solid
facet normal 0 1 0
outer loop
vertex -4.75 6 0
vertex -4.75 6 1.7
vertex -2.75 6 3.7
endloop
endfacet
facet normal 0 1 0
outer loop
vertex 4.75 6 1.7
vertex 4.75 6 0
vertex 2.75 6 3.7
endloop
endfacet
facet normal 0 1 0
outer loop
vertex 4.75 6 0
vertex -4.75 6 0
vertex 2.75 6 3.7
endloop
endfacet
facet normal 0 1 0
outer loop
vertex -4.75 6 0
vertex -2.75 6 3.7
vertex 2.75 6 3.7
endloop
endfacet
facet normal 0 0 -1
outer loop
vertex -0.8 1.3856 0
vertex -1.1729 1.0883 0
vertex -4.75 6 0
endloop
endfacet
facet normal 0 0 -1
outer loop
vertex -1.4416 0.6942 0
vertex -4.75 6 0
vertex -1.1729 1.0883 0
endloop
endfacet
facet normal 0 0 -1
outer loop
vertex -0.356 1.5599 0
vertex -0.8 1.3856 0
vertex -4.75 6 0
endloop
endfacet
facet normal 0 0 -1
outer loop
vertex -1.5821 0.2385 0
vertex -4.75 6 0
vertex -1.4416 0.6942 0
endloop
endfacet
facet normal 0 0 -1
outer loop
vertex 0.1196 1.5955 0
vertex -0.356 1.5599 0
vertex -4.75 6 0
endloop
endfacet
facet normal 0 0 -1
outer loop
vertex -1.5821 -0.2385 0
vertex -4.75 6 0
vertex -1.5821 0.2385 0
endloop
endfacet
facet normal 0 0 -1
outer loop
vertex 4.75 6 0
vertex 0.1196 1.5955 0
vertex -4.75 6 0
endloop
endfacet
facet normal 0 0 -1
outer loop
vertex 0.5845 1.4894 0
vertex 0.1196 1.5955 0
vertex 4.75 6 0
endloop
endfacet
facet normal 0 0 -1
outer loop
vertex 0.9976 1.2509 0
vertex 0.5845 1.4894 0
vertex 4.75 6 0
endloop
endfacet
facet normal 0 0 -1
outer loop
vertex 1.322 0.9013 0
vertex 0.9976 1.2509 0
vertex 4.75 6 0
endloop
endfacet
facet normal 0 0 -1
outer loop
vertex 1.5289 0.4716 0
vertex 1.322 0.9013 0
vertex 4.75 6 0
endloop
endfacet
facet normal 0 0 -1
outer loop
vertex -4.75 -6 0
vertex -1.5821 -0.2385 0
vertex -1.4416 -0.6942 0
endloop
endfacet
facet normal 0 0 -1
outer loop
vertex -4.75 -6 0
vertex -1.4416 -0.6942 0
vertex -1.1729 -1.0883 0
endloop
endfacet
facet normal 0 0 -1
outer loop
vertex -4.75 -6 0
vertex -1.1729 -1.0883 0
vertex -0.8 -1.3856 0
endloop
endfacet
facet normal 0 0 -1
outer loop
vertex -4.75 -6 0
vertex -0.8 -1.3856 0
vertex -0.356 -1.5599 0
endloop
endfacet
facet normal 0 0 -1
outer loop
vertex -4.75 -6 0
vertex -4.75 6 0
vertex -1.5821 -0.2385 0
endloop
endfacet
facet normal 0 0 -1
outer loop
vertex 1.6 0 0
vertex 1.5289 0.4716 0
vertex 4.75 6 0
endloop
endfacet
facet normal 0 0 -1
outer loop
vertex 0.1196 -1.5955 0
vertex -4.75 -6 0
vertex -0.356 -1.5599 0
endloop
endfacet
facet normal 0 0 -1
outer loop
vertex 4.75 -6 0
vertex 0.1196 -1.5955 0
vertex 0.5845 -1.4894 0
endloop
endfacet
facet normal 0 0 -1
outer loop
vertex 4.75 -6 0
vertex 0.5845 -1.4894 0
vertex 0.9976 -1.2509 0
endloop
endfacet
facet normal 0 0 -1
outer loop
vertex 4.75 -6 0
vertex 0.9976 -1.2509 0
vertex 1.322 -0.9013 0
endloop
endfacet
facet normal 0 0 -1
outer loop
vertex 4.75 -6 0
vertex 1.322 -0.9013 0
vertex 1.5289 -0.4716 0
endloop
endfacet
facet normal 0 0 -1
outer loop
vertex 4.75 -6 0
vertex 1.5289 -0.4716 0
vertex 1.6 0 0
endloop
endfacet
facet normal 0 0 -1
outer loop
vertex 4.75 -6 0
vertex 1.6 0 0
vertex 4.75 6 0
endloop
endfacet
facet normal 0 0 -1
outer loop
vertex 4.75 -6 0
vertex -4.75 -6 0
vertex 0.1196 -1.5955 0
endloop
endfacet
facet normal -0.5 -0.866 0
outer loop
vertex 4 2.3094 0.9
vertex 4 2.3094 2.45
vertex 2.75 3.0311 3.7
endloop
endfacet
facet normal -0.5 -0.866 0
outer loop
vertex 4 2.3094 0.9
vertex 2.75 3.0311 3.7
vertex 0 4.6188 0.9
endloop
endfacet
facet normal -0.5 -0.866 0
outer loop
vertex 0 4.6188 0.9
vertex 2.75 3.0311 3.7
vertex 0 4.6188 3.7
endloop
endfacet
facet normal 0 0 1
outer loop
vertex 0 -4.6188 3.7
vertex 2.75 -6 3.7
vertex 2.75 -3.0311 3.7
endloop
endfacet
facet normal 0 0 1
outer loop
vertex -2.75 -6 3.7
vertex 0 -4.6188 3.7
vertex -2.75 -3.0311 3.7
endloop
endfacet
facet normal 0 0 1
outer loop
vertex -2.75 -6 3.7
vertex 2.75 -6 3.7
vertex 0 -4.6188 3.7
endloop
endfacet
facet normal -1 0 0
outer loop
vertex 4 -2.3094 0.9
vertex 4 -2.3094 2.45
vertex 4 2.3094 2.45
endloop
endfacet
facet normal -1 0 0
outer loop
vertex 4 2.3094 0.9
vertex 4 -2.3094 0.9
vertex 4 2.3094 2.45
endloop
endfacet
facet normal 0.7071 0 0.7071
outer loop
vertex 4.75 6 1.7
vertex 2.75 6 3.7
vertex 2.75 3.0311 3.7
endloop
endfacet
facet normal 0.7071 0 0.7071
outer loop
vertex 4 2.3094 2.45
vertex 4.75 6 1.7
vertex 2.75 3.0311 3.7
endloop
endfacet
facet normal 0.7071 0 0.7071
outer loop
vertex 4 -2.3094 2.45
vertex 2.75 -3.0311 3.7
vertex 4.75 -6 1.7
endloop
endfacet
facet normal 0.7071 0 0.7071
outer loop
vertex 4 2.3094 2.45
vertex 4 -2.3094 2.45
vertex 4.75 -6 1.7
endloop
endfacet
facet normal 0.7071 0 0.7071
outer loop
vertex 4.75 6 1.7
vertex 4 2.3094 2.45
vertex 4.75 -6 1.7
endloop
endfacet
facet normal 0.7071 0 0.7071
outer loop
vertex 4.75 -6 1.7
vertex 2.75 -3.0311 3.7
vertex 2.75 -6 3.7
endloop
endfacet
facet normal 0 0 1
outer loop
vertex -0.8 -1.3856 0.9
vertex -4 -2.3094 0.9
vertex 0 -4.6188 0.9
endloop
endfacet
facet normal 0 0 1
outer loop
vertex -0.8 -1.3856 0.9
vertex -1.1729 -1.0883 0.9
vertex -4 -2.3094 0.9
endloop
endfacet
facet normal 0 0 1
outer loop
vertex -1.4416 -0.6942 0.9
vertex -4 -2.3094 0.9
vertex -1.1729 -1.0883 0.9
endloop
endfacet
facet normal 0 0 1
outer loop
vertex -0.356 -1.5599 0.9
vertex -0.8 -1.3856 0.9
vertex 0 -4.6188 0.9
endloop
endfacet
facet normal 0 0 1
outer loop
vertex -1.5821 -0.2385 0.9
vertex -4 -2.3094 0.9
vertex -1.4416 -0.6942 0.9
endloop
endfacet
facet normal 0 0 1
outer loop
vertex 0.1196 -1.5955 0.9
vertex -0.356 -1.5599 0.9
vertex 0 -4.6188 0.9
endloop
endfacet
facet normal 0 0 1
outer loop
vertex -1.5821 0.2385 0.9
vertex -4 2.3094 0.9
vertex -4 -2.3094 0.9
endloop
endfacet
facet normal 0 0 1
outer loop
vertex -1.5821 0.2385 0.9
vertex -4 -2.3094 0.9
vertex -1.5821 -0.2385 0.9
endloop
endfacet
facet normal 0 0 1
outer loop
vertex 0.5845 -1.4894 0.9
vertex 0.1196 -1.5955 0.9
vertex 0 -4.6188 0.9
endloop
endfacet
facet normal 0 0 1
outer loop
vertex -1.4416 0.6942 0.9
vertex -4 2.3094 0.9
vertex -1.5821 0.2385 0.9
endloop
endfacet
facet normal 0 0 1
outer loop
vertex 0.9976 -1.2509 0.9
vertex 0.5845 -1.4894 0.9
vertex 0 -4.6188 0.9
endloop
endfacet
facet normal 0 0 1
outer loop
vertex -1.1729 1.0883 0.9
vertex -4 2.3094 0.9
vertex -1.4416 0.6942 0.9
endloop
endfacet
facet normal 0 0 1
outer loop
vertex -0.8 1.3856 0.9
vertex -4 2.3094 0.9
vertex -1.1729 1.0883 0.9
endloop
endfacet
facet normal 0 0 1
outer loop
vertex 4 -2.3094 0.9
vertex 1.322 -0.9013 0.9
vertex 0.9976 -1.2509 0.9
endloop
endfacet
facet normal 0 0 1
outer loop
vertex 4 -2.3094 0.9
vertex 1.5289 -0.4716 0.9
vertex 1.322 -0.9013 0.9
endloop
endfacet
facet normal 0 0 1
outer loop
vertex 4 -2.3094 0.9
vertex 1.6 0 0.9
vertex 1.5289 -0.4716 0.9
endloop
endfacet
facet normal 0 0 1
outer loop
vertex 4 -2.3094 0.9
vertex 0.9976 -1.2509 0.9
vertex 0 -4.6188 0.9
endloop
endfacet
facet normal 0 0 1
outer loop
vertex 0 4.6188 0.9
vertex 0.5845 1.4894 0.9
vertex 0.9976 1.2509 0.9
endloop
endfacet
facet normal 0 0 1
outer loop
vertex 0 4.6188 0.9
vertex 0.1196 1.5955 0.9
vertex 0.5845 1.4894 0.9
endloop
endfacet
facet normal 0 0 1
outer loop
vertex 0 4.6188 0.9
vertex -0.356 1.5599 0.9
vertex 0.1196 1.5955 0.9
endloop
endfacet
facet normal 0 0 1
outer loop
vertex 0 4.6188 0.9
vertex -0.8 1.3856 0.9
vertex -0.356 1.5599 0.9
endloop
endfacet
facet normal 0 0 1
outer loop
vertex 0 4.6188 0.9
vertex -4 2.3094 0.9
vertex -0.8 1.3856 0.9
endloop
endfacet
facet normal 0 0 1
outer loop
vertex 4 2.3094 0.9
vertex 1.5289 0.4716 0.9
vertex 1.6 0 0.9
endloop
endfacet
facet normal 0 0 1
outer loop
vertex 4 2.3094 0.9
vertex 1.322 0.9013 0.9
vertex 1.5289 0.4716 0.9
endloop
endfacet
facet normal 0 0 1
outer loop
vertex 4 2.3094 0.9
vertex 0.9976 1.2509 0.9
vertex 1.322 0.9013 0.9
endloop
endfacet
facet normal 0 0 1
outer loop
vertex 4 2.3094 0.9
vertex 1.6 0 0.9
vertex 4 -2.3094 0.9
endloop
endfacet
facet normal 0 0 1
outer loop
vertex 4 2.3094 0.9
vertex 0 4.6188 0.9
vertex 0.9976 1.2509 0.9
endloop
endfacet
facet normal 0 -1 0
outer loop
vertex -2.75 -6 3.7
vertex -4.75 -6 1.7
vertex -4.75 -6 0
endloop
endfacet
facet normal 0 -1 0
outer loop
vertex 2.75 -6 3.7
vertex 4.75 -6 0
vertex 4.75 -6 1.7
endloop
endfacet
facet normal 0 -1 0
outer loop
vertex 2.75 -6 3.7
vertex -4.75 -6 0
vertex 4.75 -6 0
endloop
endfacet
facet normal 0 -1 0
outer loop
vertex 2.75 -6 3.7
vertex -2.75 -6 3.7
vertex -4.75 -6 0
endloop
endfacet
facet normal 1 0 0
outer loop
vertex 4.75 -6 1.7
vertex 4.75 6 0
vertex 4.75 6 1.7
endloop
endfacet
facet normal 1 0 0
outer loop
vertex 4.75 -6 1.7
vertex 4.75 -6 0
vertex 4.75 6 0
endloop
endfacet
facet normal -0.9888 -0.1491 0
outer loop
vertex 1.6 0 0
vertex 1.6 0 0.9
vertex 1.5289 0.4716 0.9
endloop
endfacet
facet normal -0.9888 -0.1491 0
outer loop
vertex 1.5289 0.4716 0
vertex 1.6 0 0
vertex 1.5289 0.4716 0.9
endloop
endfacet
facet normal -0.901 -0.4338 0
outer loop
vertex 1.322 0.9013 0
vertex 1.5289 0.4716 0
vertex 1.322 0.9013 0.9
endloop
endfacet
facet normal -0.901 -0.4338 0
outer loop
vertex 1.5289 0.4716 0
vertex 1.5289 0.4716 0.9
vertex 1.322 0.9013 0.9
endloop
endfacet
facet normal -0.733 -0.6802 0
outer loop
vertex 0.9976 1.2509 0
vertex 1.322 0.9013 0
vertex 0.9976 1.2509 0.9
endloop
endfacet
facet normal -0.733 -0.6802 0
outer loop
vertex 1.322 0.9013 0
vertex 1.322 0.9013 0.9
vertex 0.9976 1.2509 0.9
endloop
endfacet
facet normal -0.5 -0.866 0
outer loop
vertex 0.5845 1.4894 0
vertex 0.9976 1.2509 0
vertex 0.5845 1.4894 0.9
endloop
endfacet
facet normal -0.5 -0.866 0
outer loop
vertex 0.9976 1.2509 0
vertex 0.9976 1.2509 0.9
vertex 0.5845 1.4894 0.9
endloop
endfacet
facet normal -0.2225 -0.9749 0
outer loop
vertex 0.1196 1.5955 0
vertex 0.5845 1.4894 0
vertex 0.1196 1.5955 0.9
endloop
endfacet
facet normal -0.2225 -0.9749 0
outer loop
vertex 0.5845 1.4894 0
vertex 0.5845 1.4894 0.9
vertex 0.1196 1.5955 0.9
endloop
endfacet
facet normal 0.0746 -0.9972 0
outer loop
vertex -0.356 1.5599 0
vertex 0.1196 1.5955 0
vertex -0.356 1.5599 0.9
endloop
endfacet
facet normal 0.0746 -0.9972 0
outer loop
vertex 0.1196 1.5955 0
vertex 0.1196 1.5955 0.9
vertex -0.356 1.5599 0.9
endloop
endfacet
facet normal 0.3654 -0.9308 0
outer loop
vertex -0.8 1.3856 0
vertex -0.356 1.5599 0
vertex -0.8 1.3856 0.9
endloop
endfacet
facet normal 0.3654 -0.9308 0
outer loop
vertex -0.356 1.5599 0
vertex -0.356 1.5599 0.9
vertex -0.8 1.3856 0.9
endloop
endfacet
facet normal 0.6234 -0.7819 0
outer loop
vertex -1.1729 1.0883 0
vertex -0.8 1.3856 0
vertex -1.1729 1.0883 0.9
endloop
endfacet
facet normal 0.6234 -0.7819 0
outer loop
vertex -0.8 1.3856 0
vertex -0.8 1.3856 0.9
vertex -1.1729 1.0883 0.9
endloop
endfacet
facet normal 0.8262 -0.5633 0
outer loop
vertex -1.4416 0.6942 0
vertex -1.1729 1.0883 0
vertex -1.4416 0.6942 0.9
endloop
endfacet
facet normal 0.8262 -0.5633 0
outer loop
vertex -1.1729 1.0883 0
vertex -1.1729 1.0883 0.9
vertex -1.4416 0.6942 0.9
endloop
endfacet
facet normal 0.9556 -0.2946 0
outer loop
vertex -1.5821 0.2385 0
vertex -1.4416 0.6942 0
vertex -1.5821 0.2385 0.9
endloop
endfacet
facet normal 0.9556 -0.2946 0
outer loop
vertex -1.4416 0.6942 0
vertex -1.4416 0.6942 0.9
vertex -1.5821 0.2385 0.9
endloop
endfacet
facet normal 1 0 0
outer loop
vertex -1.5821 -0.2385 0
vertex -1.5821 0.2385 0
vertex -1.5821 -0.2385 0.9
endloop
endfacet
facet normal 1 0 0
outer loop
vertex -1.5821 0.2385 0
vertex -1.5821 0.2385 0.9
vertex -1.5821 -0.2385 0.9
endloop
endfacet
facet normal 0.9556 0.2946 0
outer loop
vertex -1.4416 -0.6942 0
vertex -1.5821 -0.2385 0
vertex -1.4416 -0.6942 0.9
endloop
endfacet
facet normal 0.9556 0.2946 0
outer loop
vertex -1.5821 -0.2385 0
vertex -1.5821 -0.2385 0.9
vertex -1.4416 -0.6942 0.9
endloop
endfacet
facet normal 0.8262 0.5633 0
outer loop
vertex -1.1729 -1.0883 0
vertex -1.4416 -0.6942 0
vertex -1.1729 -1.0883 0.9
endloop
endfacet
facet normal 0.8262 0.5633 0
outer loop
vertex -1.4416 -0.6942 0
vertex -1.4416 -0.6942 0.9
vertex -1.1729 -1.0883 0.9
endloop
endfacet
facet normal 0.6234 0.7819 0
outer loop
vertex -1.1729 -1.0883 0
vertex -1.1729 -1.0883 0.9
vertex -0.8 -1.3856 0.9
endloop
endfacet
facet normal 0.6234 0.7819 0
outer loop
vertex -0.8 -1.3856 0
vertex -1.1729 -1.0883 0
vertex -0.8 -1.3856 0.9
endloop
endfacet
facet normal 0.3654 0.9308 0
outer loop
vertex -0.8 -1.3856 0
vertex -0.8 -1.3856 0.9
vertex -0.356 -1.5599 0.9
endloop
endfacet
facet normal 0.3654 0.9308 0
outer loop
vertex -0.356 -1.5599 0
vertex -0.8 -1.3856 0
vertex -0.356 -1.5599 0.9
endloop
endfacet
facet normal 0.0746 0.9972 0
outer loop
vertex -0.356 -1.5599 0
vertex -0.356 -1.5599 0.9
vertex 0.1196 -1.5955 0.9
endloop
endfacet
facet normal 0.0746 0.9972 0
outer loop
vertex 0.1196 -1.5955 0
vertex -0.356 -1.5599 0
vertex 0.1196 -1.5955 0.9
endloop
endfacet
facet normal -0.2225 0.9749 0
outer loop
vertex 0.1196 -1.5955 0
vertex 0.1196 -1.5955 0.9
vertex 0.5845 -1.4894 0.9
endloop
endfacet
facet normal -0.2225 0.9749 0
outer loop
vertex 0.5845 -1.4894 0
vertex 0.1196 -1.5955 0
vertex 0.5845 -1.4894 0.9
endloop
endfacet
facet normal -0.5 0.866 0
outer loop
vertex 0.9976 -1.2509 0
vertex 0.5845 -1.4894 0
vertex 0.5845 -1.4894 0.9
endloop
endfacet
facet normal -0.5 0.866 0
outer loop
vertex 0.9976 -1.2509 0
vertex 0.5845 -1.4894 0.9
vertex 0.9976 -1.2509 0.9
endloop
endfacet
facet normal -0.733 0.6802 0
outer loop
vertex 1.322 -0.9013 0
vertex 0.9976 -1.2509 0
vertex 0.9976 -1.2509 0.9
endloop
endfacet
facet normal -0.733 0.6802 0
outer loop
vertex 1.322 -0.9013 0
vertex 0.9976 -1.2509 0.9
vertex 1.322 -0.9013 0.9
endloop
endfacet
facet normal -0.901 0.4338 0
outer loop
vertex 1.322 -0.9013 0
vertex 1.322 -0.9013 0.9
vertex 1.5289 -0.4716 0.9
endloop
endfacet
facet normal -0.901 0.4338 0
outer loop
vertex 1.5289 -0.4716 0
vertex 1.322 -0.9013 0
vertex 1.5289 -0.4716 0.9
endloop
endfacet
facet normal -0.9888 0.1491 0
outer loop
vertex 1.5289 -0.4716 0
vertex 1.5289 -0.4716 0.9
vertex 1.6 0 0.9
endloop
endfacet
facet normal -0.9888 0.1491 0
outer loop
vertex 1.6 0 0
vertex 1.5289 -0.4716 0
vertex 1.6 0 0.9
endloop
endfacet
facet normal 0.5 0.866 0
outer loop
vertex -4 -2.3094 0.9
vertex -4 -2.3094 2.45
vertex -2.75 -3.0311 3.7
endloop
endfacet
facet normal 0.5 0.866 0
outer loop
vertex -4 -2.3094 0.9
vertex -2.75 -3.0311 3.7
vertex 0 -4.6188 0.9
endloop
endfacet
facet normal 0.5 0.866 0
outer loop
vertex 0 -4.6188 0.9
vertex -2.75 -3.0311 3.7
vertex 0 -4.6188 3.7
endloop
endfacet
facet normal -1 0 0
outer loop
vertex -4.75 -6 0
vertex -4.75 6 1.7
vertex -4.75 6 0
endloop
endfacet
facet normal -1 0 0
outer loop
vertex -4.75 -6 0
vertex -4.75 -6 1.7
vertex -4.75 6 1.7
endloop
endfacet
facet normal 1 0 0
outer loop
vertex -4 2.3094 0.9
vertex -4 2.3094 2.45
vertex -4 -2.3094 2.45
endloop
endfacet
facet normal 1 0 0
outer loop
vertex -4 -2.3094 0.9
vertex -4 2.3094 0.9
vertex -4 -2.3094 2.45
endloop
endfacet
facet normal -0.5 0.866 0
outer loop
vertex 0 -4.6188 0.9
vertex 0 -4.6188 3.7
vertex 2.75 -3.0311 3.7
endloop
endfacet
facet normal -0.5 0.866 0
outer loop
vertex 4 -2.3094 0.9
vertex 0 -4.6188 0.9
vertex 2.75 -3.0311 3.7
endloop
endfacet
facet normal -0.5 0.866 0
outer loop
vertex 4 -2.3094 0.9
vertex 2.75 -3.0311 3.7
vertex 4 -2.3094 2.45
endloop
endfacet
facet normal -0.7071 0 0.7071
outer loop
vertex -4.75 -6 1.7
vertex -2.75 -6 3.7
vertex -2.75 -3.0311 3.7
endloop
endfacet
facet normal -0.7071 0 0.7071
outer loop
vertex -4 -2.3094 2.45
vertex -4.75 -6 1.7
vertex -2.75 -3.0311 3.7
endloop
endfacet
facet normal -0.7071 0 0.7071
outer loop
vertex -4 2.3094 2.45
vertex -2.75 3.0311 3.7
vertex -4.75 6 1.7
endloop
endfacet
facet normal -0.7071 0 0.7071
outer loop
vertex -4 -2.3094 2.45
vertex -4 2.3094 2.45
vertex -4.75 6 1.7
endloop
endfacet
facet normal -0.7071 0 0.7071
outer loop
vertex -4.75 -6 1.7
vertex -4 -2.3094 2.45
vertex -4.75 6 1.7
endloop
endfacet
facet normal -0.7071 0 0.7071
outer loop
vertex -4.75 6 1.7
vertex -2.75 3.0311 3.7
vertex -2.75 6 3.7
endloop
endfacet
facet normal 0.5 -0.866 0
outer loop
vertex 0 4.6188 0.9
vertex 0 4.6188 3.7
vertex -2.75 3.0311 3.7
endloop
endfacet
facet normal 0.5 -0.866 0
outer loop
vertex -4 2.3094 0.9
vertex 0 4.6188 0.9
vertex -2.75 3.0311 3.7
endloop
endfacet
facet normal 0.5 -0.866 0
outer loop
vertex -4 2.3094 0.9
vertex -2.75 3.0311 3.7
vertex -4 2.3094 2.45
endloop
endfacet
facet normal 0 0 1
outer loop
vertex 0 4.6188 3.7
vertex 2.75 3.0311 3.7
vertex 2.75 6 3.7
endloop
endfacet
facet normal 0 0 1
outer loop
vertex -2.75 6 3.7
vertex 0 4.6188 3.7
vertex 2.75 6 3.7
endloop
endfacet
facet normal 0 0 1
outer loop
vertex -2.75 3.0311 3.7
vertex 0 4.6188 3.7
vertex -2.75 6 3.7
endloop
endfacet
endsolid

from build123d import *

# Parameters (mm, degrees)
F1_DEPTH = 6
F2_R     = 1.6
F3_DEPTH = 3.7
F5_SIZE2 = 2
F5_SIZE  = 2
F6_DEPTH = 2.8


with BuildPart() as f1:
    # F0 (on Front) → F1 (new body, symmetric)
    with BuildSketch(Plane.XZ):
        Polygon((-4.75, 0), (0, 0), (4.75, 0), (4.75, 3.7), (-4.75, 3.7), align=None)
    extrude(amount=F1_DEPTH, both=True)

    # F2 (on face) → F3 (cut, through all)
    with BuildSketch(Plane.XY.offset(3.7)):
        Circle(F2_R)
    extrude(amount=-F3_DEPTH, mode=Mode.SUBTRACT)

    # F5
    f5_edges = [f1.edges().sort_by_distance(p)[0] for p in [
        (-4.75, 0, 3.7),
        (4.75, 0, 3.7),
    ]]
    chamfer(f5_edges, length=F5_SIZE, length2=F5_SIZE2)

    # F4 (on face) → F6 (cut)
    with BuildSketch(Plane.XY.offset(3.7)):
        Polygon((4, -2.309401), (4, 2.309401), (0, 4.618802), (-4, 2.309401), (-4, -2.309401), (0, -4.618802), align=None)
    extrude(amount=-F6_DEPTH, mode=Mode.SUBTRACT)


solid = f1.part
